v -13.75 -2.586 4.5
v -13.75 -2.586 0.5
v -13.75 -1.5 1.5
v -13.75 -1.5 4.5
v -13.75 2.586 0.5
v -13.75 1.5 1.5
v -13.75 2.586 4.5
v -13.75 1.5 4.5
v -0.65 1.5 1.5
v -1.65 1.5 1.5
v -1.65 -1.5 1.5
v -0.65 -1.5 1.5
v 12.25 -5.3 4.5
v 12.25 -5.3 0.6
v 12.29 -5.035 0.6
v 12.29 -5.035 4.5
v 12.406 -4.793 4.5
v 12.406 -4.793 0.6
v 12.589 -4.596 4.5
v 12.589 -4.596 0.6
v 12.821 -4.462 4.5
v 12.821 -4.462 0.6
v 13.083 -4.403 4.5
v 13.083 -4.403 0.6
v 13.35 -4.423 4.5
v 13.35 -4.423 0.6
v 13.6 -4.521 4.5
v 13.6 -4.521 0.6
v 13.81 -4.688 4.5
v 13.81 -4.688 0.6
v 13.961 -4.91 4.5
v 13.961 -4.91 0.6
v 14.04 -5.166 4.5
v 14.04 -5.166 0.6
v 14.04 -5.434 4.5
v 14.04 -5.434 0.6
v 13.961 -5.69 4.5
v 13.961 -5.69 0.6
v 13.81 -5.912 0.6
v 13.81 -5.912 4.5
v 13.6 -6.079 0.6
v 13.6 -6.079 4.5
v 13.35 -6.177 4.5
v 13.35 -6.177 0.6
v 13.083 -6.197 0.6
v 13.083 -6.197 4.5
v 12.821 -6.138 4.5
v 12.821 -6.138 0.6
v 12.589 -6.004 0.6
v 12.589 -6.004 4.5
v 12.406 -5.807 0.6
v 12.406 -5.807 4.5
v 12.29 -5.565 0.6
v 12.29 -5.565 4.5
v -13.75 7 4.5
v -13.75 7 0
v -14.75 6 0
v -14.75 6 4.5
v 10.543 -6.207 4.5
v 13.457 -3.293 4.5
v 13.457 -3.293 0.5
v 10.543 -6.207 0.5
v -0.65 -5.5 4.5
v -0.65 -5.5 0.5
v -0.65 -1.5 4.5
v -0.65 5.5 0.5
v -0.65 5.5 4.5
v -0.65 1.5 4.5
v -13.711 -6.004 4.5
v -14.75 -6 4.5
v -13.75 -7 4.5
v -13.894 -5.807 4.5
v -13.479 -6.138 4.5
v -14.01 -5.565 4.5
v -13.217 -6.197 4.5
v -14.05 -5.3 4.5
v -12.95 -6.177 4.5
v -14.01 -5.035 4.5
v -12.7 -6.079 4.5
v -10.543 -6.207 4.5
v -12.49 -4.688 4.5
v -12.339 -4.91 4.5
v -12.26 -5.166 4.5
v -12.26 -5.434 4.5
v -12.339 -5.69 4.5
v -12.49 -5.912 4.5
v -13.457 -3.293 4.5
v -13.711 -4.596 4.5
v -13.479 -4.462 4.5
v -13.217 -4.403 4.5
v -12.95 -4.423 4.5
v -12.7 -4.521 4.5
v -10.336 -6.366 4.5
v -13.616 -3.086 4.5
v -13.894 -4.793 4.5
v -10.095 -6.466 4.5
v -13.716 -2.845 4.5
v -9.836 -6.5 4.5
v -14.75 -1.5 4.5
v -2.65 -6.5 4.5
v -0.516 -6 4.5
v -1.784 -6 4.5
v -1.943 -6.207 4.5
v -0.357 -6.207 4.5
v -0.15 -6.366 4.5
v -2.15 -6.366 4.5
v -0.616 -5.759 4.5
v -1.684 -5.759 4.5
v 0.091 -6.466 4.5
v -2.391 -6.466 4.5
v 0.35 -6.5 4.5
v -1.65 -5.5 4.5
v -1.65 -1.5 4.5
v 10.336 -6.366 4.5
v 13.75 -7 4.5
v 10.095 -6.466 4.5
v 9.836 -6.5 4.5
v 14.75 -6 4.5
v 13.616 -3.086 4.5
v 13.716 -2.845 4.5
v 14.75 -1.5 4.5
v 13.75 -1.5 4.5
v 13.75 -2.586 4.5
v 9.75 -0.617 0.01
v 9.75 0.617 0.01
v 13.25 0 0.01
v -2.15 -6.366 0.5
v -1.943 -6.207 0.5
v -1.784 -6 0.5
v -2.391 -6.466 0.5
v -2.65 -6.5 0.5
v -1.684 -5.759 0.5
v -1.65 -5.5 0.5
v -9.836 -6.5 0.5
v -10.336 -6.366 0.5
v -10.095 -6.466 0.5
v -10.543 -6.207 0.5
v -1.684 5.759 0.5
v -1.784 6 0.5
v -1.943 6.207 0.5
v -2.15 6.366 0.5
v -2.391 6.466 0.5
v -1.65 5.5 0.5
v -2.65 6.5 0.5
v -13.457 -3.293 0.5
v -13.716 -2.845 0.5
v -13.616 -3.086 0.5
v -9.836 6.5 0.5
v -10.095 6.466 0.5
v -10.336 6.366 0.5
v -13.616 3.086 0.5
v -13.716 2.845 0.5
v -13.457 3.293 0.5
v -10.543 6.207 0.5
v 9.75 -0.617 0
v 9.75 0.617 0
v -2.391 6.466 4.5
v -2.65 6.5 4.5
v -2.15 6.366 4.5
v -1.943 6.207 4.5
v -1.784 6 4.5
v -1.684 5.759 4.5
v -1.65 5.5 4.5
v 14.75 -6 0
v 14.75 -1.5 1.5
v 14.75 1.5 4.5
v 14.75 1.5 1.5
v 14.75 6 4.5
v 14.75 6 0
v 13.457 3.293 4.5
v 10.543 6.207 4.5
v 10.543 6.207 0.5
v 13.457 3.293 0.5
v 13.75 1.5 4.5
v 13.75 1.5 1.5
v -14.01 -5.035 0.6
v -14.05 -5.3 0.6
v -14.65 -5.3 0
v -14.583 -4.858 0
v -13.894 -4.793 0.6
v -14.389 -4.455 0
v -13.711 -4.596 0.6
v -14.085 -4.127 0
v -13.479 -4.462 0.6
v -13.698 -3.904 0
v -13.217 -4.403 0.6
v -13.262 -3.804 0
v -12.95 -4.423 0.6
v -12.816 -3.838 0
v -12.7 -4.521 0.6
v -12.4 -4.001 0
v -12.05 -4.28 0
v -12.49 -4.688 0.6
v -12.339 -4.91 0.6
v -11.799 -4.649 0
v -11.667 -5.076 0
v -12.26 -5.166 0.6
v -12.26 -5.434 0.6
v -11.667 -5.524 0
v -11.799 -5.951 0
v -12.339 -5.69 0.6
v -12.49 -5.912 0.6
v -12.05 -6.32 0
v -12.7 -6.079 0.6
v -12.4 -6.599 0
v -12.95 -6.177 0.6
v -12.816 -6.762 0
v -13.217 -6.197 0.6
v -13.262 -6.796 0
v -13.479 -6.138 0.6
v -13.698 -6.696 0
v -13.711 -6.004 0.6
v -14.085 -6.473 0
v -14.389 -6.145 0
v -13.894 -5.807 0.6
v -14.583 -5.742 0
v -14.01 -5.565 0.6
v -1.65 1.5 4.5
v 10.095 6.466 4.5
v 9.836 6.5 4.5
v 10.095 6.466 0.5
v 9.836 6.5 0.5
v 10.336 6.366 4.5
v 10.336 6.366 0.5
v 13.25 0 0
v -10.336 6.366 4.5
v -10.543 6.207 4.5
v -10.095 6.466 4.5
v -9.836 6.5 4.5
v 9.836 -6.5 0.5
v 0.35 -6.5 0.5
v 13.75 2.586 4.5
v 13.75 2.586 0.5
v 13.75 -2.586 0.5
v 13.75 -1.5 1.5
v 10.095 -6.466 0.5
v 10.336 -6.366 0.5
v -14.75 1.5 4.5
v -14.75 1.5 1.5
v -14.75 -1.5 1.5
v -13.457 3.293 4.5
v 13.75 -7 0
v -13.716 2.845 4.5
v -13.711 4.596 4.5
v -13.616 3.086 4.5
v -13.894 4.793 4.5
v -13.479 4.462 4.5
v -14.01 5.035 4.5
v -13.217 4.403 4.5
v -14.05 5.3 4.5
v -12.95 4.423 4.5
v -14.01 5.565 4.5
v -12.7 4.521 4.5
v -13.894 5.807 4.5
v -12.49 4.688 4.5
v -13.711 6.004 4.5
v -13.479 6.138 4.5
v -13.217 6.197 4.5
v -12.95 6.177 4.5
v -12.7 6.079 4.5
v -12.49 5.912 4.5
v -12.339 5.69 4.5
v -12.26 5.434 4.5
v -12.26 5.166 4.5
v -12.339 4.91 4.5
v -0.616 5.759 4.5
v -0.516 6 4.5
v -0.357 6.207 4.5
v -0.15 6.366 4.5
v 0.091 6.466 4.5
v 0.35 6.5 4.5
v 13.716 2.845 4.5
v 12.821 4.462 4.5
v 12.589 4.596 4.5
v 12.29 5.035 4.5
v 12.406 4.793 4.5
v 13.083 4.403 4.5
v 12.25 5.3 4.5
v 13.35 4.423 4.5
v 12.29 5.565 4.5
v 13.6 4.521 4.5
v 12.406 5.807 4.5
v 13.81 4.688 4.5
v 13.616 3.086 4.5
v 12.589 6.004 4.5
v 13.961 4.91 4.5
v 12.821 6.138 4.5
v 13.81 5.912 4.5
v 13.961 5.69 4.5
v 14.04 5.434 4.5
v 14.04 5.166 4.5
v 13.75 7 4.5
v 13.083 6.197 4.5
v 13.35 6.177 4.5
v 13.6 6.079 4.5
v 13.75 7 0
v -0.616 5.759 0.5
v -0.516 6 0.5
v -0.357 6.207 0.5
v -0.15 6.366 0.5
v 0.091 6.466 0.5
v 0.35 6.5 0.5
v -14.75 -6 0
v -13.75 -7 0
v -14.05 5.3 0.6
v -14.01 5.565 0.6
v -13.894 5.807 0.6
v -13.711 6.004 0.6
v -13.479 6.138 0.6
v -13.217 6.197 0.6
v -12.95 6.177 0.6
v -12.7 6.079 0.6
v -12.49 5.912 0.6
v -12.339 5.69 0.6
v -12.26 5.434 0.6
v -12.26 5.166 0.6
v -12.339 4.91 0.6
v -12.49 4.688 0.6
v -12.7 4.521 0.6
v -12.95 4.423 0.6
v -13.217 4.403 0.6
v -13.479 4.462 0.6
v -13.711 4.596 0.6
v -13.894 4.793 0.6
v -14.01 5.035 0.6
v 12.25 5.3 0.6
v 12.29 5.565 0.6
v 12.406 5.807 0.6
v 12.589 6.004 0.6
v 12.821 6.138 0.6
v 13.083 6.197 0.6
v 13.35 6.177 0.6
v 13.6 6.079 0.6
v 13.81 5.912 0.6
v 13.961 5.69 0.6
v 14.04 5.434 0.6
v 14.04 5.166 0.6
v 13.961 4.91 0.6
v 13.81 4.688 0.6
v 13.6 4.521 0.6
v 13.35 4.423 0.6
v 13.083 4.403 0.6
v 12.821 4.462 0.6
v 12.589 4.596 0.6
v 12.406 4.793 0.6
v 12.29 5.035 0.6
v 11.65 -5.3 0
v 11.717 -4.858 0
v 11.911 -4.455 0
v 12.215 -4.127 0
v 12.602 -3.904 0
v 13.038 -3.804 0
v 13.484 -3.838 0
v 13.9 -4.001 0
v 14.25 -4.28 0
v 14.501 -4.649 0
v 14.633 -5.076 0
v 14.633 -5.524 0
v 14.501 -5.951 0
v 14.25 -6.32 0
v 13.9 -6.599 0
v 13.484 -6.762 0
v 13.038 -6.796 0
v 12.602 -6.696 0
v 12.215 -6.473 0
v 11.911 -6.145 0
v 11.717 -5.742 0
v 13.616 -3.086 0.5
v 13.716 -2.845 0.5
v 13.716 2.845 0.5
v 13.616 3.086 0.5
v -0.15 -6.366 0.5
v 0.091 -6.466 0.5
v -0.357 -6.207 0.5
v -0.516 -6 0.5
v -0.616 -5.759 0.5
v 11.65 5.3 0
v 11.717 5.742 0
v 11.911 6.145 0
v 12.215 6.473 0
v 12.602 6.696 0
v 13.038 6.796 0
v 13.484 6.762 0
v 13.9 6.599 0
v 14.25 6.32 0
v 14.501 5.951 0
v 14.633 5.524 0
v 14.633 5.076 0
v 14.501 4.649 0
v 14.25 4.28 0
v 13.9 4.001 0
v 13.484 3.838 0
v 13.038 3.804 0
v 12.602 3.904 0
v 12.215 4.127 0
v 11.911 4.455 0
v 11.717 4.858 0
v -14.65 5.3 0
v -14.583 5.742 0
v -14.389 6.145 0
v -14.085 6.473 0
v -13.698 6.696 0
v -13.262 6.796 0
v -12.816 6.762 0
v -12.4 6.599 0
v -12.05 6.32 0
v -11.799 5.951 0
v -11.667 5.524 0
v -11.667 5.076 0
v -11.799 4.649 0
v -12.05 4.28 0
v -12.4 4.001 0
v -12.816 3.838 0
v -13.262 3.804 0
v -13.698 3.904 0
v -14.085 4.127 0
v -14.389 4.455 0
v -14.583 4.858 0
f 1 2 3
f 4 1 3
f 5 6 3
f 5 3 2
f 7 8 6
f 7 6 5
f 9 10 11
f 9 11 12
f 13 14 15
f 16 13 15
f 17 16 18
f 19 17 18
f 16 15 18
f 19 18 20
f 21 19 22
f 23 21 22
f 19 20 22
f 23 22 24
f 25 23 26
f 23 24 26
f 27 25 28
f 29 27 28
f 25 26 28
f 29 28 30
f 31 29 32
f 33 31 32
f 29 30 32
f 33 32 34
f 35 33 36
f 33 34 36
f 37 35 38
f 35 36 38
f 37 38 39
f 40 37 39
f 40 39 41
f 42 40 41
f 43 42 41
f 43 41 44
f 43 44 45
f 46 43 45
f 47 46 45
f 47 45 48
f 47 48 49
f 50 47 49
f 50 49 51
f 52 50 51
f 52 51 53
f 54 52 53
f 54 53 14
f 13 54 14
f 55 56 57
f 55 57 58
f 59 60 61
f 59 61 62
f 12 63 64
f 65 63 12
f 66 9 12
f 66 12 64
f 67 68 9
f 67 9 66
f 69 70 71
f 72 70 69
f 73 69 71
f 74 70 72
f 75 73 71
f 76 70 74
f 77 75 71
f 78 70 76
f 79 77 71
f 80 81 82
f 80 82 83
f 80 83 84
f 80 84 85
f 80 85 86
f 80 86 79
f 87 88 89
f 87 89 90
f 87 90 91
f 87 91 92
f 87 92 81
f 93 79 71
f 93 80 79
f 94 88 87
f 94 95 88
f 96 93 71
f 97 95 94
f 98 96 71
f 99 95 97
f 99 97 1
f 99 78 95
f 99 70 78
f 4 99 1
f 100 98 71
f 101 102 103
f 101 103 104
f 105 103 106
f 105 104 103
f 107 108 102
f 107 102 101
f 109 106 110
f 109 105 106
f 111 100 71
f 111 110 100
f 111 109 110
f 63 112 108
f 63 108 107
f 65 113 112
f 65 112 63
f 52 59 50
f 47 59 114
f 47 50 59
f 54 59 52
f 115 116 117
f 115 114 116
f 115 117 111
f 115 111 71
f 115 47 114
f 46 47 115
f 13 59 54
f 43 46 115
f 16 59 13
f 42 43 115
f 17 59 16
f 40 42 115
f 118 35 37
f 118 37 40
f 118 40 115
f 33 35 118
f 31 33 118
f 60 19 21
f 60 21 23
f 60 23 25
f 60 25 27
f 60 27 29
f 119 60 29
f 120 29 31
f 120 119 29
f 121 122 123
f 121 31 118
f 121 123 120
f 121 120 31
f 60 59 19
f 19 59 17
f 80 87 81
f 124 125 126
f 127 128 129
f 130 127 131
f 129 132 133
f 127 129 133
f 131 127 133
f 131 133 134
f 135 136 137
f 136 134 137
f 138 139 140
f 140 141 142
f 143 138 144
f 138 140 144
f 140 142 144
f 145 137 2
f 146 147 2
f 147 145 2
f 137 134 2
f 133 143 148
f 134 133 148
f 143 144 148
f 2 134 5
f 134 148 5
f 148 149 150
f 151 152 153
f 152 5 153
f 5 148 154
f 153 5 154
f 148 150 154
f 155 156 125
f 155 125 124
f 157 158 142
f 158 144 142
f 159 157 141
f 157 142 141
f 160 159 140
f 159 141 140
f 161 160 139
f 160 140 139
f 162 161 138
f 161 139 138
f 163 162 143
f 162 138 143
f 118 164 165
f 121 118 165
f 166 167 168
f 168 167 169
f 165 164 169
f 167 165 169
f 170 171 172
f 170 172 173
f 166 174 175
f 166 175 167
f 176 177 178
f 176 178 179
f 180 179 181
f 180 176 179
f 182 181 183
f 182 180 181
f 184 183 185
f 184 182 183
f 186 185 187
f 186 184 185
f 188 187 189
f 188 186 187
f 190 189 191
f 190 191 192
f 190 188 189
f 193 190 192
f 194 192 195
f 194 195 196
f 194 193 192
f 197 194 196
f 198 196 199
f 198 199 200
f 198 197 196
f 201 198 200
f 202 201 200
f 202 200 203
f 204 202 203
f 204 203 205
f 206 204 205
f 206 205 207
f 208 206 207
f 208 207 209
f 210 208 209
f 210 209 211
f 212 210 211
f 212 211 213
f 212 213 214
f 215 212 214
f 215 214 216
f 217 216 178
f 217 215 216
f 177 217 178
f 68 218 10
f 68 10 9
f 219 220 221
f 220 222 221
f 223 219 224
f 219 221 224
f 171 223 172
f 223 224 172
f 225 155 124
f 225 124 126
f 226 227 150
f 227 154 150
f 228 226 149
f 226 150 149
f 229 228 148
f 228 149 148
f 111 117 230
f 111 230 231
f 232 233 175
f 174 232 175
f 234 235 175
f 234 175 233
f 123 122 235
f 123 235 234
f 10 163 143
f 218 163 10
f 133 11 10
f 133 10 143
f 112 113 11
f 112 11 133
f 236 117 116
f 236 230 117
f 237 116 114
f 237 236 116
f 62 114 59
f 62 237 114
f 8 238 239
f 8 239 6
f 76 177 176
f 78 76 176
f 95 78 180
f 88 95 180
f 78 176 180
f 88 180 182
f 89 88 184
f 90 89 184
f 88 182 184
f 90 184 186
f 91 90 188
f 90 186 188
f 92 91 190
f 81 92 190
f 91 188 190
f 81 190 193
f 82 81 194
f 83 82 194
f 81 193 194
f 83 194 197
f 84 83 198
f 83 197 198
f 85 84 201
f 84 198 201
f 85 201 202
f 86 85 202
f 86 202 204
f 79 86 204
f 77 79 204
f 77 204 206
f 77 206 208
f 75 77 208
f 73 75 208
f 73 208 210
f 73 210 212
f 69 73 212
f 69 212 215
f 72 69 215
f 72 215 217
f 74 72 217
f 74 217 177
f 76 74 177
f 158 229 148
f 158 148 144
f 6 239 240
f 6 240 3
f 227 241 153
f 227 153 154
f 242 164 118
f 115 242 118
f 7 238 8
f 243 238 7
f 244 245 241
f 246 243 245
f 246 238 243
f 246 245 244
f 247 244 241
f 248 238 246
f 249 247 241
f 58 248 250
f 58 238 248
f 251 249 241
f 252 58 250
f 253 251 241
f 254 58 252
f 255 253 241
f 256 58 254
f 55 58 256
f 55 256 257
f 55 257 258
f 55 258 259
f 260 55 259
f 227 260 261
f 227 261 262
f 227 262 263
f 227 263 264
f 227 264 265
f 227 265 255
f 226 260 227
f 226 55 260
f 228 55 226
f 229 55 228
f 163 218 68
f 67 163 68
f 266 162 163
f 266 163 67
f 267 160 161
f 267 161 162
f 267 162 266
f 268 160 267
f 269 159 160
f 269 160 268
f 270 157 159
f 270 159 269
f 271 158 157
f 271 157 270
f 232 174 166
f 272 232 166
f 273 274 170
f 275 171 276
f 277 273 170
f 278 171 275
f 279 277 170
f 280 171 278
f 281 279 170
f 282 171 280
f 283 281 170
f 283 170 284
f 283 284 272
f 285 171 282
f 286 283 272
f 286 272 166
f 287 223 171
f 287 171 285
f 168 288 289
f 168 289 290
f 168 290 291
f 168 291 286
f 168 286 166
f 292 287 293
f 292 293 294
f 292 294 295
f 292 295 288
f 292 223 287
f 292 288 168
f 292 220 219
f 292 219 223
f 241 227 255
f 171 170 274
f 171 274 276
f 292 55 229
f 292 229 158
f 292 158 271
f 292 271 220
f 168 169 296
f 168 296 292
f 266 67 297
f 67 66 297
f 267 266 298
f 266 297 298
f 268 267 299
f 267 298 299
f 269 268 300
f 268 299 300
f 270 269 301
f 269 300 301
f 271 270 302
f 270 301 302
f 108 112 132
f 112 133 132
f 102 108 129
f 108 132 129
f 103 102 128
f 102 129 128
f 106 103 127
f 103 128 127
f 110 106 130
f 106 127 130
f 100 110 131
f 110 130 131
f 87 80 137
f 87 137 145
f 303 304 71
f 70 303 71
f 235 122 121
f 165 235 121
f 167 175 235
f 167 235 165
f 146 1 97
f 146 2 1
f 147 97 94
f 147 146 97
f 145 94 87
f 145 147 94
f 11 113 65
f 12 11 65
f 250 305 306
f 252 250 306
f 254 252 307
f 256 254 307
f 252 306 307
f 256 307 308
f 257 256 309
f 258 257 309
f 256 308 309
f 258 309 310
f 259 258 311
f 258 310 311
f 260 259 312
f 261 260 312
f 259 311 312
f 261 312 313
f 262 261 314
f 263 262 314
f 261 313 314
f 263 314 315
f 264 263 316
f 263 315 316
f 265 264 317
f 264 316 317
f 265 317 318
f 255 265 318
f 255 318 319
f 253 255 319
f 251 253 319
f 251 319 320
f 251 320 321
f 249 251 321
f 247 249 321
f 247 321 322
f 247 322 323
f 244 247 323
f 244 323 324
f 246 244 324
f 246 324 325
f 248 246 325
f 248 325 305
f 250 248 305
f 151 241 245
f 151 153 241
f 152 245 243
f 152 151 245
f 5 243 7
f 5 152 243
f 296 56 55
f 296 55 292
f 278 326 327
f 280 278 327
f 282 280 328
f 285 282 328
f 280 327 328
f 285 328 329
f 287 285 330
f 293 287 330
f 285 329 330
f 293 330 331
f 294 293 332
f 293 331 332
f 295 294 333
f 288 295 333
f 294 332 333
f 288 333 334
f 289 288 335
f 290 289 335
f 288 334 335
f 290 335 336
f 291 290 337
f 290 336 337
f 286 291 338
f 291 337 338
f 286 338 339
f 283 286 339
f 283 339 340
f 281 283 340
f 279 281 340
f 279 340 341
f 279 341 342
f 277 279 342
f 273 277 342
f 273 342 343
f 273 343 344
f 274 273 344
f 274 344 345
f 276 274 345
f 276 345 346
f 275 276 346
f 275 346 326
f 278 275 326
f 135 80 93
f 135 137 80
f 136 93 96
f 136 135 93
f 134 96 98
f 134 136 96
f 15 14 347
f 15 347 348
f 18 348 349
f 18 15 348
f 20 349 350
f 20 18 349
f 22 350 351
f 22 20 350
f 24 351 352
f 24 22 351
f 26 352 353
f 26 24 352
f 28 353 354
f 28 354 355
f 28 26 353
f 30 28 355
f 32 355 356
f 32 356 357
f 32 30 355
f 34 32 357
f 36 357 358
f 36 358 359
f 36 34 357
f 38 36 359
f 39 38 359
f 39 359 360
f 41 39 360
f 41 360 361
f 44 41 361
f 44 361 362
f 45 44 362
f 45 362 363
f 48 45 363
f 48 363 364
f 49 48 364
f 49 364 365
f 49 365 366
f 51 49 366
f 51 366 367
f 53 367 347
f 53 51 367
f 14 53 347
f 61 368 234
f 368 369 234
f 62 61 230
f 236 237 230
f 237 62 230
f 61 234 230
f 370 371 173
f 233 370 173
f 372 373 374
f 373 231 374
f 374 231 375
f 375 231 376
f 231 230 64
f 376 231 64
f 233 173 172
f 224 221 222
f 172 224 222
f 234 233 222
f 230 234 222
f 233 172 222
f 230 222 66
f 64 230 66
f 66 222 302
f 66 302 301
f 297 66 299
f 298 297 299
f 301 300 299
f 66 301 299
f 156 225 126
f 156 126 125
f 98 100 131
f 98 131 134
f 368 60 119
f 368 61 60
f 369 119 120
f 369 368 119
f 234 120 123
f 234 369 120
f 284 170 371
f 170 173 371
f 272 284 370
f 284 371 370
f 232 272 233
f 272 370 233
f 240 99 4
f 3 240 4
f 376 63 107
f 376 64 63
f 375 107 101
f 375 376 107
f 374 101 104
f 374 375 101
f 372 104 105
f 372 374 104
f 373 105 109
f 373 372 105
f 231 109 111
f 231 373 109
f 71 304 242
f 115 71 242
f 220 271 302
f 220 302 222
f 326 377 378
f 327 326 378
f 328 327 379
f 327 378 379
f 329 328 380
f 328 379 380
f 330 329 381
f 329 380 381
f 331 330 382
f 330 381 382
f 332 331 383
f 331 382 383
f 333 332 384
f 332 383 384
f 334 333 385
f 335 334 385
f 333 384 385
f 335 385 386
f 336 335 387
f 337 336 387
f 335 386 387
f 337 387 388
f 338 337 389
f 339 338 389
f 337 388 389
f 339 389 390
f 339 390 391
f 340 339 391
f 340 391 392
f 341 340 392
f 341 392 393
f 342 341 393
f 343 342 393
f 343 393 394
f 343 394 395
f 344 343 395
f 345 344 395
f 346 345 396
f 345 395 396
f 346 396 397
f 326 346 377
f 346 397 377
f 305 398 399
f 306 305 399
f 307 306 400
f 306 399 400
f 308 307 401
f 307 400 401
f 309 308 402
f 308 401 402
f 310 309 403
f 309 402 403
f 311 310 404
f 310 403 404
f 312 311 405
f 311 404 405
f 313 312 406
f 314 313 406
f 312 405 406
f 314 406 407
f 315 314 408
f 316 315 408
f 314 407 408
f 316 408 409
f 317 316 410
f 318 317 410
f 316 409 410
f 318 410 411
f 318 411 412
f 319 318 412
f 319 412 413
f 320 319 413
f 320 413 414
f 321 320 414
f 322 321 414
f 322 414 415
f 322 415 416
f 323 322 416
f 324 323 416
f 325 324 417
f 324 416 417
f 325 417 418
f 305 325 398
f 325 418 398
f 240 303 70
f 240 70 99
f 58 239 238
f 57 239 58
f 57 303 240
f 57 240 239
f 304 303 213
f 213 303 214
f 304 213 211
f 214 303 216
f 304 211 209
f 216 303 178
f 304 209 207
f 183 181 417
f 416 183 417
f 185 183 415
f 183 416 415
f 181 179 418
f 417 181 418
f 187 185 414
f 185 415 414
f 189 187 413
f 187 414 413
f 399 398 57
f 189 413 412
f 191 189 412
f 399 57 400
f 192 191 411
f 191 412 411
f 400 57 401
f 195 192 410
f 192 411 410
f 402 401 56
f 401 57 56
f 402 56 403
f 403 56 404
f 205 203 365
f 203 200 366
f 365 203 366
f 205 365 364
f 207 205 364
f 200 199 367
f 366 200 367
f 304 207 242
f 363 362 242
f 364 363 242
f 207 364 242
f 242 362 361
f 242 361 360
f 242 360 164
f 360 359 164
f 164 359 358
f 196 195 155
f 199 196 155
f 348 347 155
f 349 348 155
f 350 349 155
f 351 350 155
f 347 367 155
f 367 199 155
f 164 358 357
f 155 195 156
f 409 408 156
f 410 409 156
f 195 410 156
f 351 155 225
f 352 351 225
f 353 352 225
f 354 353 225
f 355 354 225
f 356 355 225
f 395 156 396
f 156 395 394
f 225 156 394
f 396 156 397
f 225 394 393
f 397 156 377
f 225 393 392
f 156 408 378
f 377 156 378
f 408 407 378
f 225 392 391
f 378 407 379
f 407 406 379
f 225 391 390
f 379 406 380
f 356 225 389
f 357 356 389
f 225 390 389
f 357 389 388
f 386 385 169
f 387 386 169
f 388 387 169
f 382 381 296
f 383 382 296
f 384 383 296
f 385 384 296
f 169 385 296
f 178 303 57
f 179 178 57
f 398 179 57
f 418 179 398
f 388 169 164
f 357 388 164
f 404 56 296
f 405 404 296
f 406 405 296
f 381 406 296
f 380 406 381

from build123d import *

# Parameters (mm, degrees)
SKETCH_1_W              = 29.5
SKETCH_1_H              = 14
EXTRUDE_1_DEPTH         = 4.5
CUT_EXTRUDE_1_DEPTH     = 4
CHAMFER_1_SIZE          = 1
HOLE_WIZARD_M1_61_D     = 1.8
HOLE_WIZARD_M1_61_DEPTH = 14
HOLE_WIZARD_M1_61_TIP   = 0.540774557
FILLET_1_R              = 1
SKETCH_5_W              = 29.5
SKETCH_5_H              = 3
CUT_EXTRUDE_2_DEPTH     = 3
CHAMFER_2_SIZE          = 0.6
CUT_EXTRUDE_3_DEPTH     = 0.01


with BuildPart() as part:
    # Эскиз1 → Бобышка-Вытянуть1 (new body)
    with BuildSketch(Plane.XY):
        Rectangle(SKETCH_1_W, SKETCH_1_H)
    extrude(amount=EXTRUDE_1_DEPTH)

    # Эскиз2 → Вырез-Вытянуть1 (cut)
    with BuildSketch(Plane.XY.offset(4.5)):
        Polygon((-10.25, 6.5), (-1.65, 6.5), (-1.65, -6.5), (-10.25, -6.5), (-13.75, -3), (-13.75, 3), align=None)
        Polygon((-0.65, 6.5), (10.25, 6.5), (13.75, 3), (13.75, -3), (10.25, -6.5), (-0.65, -6.5), align=None)
    extrude(amount=-CUT_EXTRUDE_1_DEPTH, mode=Mode.SUBTRACT)

    # Фаска1
    chamfer_1_edges = [part.edges().sort_by_distance(p)[0] for p in [
        (14.75, -7, 2.25),
        (-14.75, -7, 2.25),
        (-14.75, 7, 2.25),
        (14.75, 7, 2.25),
    ]]
    chamfer(chamfer_1_edges, length=CHAMFER_1_SIZE)

    # Отверстие с зазором M1,61
    with Locations(Plane.XY.offset(4.5)):
        with Locations((-13.15, 5.3), (13.15, 5.3), (-13.15, -5.3), (13.15, -5.3)):
            Hole(HOLE_WIZARD_M1_61_D / 2, depth=HOLE_WIZARD_M1_61_DEPTH)
            with Locations((0, 0, -(HOLE_WIZARD_M1_61_DEPTH + HOLE_WIZARD_M1_61_TIP / 2))):  # 118° drill point
                Cone(0, HOLE_WIZARD_M1_61_D / 2, HOLE_WIZARD_M1_61_TIP, mode=Mode.SUBTRACT)

    # Скругление1
    fillet_1_edges = [part.edges().sort_by_distance(p)[0] for p in [
        (10.25, 6.5, 2.5),
        (13.75, 3, 2.5),
        (13.75, -3, 2.5),
        (10.25, -6.5, 2.5),
        (-0.65, -6.5, 2.5),
        (-0.65, 6.5, 2.5),
        (-13.75, 3, 2.5),
        (-10.25, 6.5, 2.5),
        (-1.65, 6.5, 2.5),
        (-1.65, -6.5, 2.5),
        (-10.25, -6.5, 2.5),
        (-13.75, -3, 2.5),
    ]]
    fillet(fillet_1_edges, radius=FILLET_1_R)

    # Эскиз5 → Вырез-Вытянуть2 (cut)
    with BuildSketch(Plane.XY.offset(4.5)):
        Rectangle(SKETCH_5_W, SKETCH_5_H)
    extrude(amount=-CUT_EXTRUDE_2_DEPTH, mode=Mode.SUBTRACT)

    # Фаска2
    chamfer_2_edges = [part.edges().sort_by_distance(p)[0] for p in [
        (14.05, -5.3, 0),
        (-12.25, -5.3, 0),
        (14.05, 5.3, 0),
        (-12.25, 5.3, 0),
    ]]
    chamfer(chamfer_2_edges, length=CHAMFER_2_SIZE)

    # Эскиз6 → Вырез-Вытянуть3 (cut)
    with BuildSketch(Plane(origin=(0, 0, 0), x_dir=(-1, 0, 0), z_dir=(0, 0, -1))):
        Polygon((-13.25, 0), (-9.75, 0.617144432), (-9.75, -0.617144432), align=None)
    extrude(amount=-CUT_EXTRUDE_3_DEPTH, mode=Mode.SUBTRACT)


solid = part.part
